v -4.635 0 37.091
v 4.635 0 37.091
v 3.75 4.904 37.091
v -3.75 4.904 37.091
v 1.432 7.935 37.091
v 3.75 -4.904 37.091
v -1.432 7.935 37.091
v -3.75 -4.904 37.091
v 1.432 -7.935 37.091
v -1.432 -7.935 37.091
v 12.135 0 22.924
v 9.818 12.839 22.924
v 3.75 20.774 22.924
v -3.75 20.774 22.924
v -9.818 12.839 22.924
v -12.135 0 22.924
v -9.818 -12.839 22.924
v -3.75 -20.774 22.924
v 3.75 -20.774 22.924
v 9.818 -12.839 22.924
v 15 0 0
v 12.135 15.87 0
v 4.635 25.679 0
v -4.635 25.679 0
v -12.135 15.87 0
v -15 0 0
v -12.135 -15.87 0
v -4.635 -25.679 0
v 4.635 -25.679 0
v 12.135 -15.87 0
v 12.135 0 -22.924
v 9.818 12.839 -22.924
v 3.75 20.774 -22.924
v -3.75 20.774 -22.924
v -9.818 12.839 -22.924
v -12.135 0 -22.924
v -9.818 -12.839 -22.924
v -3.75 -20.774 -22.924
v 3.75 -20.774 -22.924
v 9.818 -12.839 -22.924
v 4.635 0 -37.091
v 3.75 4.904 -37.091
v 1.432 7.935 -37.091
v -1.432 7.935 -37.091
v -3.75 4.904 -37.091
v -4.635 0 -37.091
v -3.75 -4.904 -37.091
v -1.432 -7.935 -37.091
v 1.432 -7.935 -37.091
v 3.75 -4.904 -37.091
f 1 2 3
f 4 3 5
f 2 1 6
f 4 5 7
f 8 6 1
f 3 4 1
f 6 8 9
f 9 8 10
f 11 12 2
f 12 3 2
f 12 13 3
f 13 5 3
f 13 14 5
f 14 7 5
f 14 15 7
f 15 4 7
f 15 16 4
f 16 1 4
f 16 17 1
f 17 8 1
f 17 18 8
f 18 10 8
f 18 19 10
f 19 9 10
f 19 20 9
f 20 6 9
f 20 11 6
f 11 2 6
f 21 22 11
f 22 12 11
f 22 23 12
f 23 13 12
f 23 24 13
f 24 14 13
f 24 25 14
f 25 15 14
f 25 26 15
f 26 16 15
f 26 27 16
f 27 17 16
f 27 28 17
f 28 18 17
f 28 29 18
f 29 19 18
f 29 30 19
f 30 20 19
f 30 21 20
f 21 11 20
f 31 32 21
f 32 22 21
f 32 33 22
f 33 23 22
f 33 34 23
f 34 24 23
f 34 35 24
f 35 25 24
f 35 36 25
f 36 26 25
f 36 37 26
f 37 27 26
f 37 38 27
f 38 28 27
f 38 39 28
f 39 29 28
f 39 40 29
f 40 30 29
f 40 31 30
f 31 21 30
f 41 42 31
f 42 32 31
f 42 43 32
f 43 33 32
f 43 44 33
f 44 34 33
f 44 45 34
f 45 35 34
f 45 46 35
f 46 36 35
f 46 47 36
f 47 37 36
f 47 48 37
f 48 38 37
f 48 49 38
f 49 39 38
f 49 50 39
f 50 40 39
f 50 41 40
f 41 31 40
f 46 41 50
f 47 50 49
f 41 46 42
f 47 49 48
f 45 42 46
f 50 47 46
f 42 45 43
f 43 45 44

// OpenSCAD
// Generated by SolidPython 1.0.1 on 2020-07-29 00:46:46


scale(v = [5, 9, 13]) {
	sphere(r = 3);
}
/***********************************************
*********      SolidPython code:      **********
************************************************
 
# import packages: SolidPython
from solid import *
from solid.utils import *
from itertools import chain, combinations, permutations


class Resize:

    def __init__(self, scad_file):
        self.scad_file = scad_file
        #self.scad_file = import_scad(scad_file)
        # cone/cylinder param:
        self.r1 = 0
        self.r2 = 0
        self.h = 0
        # rectangular prism param:
        self.w = 0
        self.l = 0
        # ellipse param:
        self.r = 0

    # import OpenScad code (file name corresponds to shape)


    # classify shape + parameters
    def assign(self, param1, param2, param3):
        if self.scad_file == 'cone.scad':
            self.r1 = param1
            self.r2 = param2
            self.h = param3
        elif self.scad_file == 'cylinder.scad':
            self.r1 = param1
            self.r2 = param2
            self.h = param3
        elif self.scad_file == 'rectangularPrism.scad':
            self.h = param1
            self.l = param2
            self.w = param3
        else:
            self.r = param1
            self.h = param2

    # resize parameters
    def iterate(self):
        x = range(3, 20, 2)
        i = 1
        if self.scad_file == 'cone.scad':
            tempList = list(permutations(x, 2))
            for temp in tempList:
                param1 = temp[0]
                param2 = temp[1]
                filepath = 'produced_scad_files/' + 'cone' + str(param1) + '_' + str(param2) + '_' + '.scad'
                scad_render_to_file(cylinder(h=param1, r1=param2, r2=0), filepath)

        elif self.scad_file == 'cylinder.scad':
            tempList = list(permutations(x, 3))
            for temp in tempList:
                param1 = temp[0]
                param2 = temp[1]
                filepath = 'produced_scad_files/' + 'cylinder' + str(param1) + '_' + str(param2) + '_' + '.scad'
                scad_render_to_file(cylinder(h=param1, r1=param2, r2=param2), filepath)

        elif self.scad_file == 'rectangularPrism.scad':
            tempList = list(permutations(x, 3))
            for temp in tempList:
                param1 = temp[0]
                param2 = temp[1]
                param3 = temp[2]
                filepath = 'produced_scad_files/' + 'rectangularPrism' + str(param1) + '_' + str(param2) + '_' + str(
                    param3) + '.scad'
                scad_render_to_file(cube(size=(param1, param2, param3)), filepath)

        elif self.scad_file == 'ellipse.scad':
            tempList = list(permutations(x, 4))
            for temp in tempList:
                param1 = temp[0]
                param2 = temp[1]
                param3 = temp[2]
                param4 = temp[3]
                filepath = 'produced_scad_files/' + 'ellipse' + str(param1) + '_' + str(param2) + '_' + str(param3) + '_' + str(param4) + '.scad'
                scad_render_to_file(scale([param1, param2, param3])(sphere(r=param4)), filepath)

    def render_to_scadfile(self):
        scad_render_to_file(scad, 'example.scad') 
 
************************************************/
